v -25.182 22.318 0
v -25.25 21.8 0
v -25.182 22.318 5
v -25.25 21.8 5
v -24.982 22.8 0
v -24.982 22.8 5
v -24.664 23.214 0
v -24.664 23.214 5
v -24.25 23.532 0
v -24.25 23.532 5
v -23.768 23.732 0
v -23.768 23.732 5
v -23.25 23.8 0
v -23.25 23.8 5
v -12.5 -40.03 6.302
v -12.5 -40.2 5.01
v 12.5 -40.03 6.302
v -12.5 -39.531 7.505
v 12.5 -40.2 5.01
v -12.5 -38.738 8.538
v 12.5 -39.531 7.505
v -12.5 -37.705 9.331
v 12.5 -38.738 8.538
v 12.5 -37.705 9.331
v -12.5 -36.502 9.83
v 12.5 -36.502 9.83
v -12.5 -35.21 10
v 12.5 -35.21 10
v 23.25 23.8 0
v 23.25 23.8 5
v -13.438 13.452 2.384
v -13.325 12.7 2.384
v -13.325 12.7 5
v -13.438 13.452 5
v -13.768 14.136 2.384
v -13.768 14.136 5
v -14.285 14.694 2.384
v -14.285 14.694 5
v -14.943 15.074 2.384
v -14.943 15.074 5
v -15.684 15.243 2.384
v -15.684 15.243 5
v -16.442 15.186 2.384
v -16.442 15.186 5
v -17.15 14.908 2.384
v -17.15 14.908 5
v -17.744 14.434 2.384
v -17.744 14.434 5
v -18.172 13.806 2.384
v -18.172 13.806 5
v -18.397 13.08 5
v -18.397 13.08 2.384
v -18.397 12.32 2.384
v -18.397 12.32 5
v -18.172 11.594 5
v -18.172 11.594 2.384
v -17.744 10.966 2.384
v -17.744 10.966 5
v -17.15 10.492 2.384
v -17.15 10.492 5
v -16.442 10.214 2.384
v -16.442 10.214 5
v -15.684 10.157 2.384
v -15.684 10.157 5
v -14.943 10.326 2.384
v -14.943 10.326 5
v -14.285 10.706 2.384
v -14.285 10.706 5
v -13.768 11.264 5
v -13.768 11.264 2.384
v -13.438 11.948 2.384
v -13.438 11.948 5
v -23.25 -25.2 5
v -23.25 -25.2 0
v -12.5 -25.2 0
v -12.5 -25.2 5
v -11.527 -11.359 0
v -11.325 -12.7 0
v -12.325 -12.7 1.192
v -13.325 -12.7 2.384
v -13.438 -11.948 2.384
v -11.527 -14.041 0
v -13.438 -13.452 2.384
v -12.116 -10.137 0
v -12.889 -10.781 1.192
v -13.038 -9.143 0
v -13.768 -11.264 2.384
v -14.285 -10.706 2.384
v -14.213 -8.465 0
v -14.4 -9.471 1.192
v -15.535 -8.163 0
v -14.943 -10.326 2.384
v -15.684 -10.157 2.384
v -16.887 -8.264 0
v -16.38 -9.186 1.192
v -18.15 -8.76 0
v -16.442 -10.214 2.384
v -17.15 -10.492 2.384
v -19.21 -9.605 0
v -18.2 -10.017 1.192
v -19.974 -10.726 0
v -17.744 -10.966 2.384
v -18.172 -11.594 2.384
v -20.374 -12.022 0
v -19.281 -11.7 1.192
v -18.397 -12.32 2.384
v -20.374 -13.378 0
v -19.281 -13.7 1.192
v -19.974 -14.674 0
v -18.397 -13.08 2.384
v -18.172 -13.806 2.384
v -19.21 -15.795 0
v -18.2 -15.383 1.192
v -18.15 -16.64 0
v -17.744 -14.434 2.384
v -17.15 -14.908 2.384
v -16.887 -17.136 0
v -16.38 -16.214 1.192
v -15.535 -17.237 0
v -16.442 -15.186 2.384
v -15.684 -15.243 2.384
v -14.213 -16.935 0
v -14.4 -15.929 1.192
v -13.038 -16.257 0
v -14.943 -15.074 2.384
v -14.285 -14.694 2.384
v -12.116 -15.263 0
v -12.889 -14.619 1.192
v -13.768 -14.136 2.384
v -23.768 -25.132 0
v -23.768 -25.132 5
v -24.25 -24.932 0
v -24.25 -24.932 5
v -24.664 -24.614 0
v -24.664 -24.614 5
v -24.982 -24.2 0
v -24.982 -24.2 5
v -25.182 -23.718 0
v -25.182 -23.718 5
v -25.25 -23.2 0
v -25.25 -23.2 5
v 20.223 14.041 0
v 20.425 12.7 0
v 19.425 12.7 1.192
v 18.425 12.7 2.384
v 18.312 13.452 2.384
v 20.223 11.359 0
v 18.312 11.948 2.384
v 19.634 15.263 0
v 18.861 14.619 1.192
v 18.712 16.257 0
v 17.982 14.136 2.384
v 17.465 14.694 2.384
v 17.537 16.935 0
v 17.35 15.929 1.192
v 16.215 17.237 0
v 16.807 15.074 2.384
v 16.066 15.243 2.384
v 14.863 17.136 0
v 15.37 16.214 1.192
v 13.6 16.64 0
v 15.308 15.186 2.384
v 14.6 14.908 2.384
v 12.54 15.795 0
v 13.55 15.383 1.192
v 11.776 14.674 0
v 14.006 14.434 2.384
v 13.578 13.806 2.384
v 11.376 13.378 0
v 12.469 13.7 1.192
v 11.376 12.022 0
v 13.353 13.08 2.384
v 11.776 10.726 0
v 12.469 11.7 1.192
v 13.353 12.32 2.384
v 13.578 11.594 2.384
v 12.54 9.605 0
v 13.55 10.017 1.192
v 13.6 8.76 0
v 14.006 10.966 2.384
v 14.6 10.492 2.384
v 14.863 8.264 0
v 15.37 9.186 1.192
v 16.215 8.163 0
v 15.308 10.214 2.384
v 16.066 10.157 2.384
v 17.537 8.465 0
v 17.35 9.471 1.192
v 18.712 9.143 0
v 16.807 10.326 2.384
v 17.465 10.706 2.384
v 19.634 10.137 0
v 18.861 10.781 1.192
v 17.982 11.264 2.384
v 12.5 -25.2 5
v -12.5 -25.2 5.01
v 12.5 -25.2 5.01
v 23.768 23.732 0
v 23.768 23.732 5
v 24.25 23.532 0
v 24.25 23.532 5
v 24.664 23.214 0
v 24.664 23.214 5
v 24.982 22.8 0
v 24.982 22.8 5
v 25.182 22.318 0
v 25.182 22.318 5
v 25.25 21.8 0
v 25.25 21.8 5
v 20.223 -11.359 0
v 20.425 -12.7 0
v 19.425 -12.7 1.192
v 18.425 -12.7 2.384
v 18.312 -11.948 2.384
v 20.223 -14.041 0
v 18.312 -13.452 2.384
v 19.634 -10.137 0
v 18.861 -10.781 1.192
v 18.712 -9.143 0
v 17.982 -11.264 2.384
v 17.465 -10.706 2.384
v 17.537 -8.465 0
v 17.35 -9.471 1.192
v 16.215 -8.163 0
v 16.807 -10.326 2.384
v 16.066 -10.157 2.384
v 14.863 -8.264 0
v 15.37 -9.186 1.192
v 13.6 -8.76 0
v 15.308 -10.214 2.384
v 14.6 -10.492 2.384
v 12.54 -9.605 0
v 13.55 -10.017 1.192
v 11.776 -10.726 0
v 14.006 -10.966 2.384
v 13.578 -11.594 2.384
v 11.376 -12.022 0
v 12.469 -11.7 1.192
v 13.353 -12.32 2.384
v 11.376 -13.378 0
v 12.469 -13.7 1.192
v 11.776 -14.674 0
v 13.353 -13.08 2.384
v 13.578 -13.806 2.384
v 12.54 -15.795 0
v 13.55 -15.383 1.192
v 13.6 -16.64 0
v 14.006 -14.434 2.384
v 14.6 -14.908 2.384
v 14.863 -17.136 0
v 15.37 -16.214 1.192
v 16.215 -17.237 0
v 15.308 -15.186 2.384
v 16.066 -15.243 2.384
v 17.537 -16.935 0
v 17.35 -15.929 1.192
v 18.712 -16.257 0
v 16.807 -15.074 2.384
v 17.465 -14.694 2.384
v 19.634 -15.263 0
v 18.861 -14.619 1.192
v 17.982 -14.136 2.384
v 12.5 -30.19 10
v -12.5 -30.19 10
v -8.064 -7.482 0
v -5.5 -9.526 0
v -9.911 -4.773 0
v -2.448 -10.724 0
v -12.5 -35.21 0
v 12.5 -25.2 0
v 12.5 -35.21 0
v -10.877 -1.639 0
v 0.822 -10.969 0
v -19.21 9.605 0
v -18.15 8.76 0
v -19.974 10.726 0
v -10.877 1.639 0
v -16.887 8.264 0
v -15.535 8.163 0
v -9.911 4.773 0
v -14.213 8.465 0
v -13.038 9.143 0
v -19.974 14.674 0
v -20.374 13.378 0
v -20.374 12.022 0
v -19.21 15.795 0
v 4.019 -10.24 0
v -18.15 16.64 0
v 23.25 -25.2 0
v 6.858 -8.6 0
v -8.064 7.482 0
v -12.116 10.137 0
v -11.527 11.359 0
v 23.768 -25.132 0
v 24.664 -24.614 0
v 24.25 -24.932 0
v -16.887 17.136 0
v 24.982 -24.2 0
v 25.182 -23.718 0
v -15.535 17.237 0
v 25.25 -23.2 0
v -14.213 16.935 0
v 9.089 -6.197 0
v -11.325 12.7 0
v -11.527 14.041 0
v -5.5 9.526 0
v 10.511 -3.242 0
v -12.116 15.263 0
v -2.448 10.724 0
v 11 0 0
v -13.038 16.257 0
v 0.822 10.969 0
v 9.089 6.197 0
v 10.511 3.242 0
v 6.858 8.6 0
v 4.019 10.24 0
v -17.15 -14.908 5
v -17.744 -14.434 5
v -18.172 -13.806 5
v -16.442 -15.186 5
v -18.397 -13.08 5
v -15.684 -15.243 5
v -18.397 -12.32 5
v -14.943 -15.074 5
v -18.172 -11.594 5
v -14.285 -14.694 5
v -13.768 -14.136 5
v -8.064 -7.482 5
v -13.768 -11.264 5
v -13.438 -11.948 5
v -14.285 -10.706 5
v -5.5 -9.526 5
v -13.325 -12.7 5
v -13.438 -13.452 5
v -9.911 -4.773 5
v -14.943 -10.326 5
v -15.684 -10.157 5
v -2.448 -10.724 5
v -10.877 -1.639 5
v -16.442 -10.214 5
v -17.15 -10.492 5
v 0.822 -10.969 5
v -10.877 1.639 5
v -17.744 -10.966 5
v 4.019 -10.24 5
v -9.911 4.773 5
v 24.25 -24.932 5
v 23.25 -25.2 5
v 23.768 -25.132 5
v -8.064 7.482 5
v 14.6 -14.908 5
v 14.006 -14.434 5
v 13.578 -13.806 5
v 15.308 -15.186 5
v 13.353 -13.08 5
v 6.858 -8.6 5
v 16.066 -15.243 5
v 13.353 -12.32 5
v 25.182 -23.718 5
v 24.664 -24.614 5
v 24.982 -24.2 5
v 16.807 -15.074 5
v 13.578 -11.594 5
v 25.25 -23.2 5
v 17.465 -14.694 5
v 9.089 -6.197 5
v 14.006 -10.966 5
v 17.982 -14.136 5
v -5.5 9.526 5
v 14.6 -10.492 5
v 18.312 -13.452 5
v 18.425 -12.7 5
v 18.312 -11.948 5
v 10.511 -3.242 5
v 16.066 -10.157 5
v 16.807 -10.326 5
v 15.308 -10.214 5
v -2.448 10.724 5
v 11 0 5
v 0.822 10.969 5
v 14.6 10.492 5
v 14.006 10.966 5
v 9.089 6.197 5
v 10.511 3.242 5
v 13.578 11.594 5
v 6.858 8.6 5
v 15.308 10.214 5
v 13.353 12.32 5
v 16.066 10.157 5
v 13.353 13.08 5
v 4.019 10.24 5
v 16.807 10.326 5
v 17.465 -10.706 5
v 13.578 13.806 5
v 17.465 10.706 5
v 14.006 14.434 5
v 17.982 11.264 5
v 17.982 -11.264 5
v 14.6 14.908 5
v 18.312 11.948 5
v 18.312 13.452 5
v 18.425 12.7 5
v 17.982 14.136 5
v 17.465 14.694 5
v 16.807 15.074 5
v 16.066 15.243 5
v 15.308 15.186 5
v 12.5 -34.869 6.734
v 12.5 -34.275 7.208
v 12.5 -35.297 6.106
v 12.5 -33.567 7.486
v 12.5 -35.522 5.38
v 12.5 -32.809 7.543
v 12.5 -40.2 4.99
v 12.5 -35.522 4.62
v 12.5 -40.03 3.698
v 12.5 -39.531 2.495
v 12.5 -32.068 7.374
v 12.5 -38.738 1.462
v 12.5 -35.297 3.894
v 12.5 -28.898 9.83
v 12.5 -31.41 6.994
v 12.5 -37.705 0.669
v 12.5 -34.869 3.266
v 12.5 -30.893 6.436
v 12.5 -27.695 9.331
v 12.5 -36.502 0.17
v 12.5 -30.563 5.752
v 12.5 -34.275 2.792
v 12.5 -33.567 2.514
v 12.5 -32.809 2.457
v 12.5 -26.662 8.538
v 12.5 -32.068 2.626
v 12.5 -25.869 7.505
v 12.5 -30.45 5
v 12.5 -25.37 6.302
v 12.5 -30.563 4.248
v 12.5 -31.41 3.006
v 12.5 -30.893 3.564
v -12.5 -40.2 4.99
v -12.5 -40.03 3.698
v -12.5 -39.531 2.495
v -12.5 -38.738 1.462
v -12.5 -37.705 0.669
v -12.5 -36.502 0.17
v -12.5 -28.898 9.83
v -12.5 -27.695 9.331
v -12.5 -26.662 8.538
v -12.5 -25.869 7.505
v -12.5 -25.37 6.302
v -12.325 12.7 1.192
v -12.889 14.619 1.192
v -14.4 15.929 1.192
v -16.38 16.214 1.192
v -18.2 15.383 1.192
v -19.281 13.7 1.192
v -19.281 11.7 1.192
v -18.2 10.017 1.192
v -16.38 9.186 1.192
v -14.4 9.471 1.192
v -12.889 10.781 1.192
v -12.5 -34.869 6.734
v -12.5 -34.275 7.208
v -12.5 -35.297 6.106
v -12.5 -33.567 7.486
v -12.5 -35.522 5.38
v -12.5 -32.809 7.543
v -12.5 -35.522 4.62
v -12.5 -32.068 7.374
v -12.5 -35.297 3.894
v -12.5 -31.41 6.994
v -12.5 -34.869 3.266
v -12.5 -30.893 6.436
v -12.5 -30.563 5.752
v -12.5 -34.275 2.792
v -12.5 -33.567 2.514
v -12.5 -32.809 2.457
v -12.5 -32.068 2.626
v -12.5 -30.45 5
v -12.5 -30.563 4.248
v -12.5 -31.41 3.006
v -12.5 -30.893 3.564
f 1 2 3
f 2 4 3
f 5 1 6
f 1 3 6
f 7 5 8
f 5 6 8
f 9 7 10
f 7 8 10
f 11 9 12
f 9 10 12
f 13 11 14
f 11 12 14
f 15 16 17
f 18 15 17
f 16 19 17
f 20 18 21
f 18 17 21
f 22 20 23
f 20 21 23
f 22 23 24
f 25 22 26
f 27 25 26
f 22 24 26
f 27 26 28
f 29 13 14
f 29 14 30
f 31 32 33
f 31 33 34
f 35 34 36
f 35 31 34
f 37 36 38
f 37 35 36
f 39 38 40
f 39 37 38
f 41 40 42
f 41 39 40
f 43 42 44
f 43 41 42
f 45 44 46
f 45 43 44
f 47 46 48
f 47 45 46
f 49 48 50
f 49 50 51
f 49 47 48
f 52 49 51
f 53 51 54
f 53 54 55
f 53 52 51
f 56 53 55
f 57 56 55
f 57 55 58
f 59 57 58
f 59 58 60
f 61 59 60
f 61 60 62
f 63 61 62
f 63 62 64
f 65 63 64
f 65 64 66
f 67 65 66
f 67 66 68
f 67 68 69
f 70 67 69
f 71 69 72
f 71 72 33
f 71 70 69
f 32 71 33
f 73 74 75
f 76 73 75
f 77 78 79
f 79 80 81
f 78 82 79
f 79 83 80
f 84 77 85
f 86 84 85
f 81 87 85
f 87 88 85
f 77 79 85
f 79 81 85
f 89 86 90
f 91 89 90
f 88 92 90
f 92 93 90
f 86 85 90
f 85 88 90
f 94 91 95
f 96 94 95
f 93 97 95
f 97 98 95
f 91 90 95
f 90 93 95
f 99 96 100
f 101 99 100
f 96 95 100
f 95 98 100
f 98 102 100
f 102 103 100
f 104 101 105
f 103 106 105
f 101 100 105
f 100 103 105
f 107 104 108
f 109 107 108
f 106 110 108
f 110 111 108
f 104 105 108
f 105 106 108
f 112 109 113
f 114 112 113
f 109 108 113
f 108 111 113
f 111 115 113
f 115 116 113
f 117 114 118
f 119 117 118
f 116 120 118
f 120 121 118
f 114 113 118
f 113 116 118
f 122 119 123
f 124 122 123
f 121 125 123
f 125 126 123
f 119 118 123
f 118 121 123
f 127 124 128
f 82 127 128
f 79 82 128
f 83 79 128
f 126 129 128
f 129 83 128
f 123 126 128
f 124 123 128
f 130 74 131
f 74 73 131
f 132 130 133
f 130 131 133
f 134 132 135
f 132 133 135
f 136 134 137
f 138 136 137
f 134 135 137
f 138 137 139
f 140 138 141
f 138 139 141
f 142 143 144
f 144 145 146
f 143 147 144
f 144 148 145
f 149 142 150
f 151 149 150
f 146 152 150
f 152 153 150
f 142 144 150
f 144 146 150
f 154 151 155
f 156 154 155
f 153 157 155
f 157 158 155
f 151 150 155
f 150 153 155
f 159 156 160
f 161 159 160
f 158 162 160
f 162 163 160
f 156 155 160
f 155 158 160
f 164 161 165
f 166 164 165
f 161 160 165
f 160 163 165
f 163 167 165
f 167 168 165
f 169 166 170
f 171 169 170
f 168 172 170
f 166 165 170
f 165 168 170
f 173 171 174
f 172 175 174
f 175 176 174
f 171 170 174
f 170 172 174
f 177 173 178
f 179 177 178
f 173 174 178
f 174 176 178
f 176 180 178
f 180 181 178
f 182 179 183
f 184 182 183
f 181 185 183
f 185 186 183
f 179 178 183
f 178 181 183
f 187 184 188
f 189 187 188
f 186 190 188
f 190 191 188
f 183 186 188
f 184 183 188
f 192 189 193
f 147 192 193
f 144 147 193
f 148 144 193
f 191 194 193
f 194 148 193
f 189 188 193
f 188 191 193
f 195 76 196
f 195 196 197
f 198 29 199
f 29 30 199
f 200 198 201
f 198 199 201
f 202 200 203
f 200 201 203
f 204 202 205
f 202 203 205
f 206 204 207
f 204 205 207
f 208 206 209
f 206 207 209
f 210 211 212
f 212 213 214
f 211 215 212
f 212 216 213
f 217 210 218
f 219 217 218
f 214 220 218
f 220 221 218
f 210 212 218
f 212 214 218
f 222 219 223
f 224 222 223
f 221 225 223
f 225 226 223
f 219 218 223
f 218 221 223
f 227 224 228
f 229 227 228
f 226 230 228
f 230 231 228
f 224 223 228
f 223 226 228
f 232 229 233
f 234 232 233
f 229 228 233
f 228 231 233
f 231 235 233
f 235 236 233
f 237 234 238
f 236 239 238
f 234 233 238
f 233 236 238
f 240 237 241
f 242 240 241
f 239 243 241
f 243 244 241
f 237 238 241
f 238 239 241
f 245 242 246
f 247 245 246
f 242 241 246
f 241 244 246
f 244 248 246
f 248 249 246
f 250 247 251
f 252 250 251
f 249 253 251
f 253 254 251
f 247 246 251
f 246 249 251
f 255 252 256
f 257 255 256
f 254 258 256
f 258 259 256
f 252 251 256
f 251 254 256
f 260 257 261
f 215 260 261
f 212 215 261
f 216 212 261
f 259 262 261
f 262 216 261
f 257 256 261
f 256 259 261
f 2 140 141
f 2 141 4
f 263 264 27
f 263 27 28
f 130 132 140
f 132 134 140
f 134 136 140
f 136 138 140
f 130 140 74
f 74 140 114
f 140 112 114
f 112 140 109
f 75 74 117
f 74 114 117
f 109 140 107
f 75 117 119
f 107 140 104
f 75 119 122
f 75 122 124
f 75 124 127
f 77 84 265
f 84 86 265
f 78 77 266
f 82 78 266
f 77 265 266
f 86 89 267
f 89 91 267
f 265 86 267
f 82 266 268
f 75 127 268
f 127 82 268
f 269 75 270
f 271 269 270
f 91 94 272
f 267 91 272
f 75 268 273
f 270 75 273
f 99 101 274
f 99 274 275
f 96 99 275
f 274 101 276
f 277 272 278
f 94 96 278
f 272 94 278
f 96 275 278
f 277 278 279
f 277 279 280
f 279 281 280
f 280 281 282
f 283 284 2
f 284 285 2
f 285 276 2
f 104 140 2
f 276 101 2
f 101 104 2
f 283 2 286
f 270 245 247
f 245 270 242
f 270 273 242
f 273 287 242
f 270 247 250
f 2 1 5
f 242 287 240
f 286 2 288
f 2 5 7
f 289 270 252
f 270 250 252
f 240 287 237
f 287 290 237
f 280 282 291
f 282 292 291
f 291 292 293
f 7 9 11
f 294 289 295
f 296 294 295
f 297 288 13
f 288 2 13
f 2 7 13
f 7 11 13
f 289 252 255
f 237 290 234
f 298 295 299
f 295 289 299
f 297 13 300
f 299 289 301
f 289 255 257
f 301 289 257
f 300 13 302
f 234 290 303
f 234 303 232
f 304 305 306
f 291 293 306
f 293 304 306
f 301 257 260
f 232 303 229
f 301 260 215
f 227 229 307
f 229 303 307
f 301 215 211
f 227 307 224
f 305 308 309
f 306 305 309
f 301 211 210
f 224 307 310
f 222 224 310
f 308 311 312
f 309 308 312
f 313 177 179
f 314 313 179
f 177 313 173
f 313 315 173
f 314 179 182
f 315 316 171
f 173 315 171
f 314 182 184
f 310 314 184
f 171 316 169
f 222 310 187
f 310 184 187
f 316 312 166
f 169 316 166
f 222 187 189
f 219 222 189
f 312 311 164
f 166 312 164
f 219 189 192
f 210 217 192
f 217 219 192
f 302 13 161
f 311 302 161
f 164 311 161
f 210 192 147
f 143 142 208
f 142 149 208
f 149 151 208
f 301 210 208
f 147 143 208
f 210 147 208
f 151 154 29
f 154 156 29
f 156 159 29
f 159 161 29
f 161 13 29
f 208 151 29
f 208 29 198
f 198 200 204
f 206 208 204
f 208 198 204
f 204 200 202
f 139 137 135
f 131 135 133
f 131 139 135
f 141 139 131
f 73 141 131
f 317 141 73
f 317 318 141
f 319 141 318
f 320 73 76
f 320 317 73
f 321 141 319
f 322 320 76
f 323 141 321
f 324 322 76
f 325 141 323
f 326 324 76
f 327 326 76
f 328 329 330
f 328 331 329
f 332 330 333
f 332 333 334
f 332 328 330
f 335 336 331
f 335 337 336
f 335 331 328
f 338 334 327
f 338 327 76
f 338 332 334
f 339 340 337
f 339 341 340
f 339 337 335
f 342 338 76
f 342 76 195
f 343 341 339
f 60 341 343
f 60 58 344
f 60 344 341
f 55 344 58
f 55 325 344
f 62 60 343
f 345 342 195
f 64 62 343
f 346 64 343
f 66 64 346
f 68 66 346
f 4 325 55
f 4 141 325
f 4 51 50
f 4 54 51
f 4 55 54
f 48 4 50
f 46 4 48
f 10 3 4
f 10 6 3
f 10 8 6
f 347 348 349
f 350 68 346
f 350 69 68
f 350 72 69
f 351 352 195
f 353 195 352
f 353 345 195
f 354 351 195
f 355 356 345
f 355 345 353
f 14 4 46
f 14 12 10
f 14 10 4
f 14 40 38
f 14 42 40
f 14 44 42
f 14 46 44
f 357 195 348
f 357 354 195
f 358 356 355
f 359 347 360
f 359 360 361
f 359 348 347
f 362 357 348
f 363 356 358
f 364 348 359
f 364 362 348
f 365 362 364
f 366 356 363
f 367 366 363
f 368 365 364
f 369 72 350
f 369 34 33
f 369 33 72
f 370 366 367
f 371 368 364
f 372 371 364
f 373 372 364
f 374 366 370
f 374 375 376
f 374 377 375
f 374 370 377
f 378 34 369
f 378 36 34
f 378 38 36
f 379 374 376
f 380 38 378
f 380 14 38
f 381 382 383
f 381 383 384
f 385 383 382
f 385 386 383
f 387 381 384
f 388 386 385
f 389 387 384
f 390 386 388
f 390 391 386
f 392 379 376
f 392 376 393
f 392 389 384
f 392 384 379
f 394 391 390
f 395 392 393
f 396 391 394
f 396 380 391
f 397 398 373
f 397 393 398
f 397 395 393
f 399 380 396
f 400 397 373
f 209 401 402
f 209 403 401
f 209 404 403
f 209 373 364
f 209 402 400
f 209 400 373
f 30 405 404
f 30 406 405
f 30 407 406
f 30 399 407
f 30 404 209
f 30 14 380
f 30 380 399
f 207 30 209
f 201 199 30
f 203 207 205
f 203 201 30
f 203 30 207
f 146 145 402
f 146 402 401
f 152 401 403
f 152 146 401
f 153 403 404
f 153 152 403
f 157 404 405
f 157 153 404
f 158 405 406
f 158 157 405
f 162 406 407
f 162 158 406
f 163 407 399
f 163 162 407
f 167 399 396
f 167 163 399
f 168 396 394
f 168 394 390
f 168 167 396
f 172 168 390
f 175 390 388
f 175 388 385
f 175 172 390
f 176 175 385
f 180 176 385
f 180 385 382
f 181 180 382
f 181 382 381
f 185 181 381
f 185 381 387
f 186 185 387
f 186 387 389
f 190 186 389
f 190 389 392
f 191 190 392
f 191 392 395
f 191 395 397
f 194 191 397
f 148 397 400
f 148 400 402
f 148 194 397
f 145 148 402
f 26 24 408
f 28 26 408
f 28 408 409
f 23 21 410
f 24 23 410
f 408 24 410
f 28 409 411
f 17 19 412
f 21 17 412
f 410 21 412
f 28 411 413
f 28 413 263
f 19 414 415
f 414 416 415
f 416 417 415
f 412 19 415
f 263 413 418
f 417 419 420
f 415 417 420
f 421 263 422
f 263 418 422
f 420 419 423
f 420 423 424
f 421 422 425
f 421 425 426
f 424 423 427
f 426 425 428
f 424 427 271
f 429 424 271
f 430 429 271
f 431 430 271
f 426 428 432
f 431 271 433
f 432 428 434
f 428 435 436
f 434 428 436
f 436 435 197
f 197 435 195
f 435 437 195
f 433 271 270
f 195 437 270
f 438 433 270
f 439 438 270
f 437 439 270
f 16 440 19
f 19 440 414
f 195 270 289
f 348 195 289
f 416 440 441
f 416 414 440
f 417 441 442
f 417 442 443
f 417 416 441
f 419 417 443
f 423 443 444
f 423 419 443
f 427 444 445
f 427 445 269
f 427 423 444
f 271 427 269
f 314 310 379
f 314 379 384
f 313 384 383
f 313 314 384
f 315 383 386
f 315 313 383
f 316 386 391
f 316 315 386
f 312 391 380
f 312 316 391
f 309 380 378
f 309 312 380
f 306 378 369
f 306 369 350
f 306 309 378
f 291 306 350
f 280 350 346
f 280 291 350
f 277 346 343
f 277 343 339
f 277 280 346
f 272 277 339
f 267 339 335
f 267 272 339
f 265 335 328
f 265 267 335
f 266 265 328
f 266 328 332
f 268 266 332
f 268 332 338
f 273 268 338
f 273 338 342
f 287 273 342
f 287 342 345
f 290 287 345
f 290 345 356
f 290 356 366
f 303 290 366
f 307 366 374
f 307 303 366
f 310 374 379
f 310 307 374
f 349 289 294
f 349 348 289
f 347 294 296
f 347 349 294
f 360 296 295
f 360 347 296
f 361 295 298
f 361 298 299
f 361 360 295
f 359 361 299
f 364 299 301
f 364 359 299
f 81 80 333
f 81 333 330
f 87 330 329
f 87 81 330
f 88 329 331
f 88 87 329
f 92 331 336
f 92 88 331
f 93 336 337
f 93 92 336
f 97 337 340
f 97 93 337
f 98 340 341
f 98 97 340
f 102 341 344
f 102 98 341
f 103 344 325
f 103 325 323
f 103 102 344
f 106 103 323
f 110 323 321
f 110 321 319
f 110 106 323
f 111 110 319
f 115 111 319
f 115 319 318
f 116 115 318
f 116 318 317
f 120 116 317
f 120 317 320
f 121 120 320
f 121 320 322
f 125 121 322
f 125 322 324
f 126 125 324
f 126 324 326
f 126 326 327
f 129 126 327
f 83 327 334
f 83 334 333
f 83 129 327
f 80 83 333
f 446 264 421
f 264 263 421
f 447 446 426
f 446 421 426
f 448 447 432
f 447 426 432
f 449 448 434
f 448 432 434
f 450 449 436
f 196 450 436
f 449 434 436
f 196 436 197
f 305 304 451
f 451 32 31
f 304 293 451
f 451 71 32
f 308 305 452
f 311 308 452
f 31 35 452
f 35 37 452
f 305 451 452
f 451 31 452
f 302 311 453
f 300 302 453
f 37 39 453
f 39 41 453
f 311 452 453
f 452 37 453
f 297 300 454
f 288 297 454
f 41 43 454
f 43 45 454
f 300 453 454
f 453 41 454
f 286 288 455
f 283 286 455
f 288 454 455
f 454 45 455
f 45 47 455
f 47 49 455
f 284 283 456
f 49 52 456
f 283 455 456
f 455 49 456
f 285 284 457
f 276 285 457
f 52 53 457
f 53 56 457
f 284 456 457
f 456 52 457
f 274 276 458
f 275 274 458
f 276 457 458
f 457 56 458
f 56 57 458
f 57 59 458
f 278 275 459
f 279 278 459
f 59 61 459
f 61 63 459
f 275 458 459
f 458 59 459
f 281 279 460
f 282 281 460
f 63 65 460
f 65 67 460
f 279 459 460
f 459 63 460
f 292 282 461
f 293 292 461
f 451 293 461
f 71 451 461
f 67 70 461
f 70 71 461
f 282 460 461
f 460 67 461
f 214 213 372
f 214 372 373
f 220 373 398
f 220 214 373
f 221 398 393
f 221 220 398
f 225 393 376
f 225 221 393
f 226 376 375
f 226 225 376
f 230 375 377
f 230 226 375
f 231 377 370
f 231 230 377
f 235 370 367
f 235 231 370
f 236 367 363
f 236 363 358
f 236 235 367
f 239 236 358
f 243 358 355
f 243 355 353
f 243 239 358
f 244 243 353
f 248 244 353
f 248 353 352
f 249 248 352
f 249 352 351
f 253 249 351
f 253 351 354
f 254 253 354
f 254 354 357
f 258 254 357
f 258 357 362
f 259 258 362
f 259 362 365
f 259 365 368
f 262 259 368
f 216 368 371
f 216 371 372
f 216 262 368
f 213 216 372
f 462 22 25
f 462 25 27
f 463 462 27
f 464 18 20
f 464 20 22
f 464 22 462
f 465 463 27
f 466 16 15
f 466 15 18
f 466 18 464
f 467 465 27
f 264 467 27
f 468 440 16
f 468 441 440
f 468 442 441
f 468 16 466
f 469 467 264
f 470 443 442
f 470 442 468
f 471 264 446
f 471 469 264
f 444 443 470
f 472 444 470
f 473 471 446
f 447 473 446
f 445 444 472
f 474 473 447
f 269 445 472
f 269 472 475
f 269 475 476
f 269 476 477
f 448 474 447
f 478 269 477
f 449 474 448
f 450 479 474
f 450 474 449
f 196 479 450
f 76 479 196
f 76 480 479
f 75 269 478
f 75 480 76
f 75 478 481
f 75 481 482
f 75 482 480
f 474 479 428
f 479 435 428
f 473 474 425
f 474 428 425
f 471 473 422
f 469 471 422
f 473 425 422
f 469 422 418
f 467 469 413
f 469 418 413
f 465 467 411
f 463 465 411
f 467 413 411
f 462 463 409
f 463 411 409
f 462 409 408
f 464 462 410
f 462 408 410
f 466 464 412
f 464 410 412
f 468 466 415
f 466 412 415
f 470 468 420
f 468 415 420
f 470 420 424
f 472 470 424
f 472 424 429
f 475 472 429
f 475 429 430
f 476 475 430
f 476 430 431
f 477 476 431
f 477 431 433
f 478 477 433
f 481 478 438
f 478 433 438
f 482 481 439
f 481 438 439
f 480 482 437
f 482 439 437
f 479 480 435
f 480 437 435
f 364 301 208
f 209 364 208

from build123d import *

# Parameters (mm, degrees)
SKETCH_W      = 50.5
SKETCH_H      = 49
SKETCH_R      = 11
SKETCH_R_2    = 2.55
PAD_DEPTH     = 5
SKETCH001_W   = 25
SKETCH001_H   = 15
PAD001_DEPTH  = 10
SKETCH002_R   = 2.55
POCKET_DEPTH  = 12.5
FILLET_R      = 4.99
FILLET001_R   = 2
CHAMFER_ANGLE = 50
CHAMFER_SIZE  = 2


with BuildPart() as part:
    # Sketch → Pad (new body)
    with BuildSketch(Plane.XY):
        with Locations((0, -0.7)):
            Rectangle(SKETCH_W, SKETCH_H)
        Circle(SKETCH_R, mode=Mode.SUBTRACT)
        with Locations((-15.875, 12.7)):
            Circle(SKETCH_R_2, mode=Mode.SUBTRACT)
        with Locations((15.875, 12.7)):
            Circle(SKETCH_R_2, mode=Mode.SUBTRACT)
        with Locations((15.875, -12.7)):
            Circle(SKETCH_R_2, mode=Mode.SUBTRACT)
        with Locations((-15.875, -12.7)):
            Circle(SKETCH_R_2, mode=Mode.SUBTRACT)
    extrude(amount=PAD_DEPTH)

    # Sketch001 → Pad001 (join)
    with BuildSketch(Plane.XY):
        with Locations((0, -32.7)):
            Rectangle(SKETCH001_W, SKETCH001_H)
    extrude(amount=PAD001_DEPTH)

    # Sketch002 → Pocket (cut, symmetric)
    with BuildSketch(Plane.YZ):
        with Locations((-33, 5)):
            Circle(SKETCH002_R)
    extrude(amount=POCKET_DEPTH, both=True, mode=Mode.SUBTRACT)

    # Fillet
    fillet_edges = [part.edges().sort_by_distance(p)[0] for p in [
        (0, -25.2, 10),
        (0, -40.2, 10),
        (0, -40.2, 0),
    ]]
    fillet(fillet_edges, radius=FILLET_R)

    # Fillet001
    fillet001_edges = [part.edges().sort_by_distance(p)[0] for p in [
        (25.25, 23.8, 2.5),
        (25.25, -25.2, 2.5),
        (-25.25, 23.8, 2.5),
        (-25.25, -25.2, 2.5),
    ]]
    fillet(fillet001_edges, radius=FILLET001_R)

    # Chamfer
    chamfer_edges = [part.edges().sort_by_distance(p)[0] for p in [
        (-18.425, 12.7, 0),
        (-18.425, -12.7, 0),
        (13.325, -12.7, 0),
        (13.325, 12.7, 0),
    ]]
    chamfer_side = part.faces().sort_by_distance((0, 23.096349, 0))[0]
    chamfer(chamfer_edges, length=CHAMFER_SIZE, angle=CHAMFER_ANGLE, reference=chamfer_side)


solid = part.part
